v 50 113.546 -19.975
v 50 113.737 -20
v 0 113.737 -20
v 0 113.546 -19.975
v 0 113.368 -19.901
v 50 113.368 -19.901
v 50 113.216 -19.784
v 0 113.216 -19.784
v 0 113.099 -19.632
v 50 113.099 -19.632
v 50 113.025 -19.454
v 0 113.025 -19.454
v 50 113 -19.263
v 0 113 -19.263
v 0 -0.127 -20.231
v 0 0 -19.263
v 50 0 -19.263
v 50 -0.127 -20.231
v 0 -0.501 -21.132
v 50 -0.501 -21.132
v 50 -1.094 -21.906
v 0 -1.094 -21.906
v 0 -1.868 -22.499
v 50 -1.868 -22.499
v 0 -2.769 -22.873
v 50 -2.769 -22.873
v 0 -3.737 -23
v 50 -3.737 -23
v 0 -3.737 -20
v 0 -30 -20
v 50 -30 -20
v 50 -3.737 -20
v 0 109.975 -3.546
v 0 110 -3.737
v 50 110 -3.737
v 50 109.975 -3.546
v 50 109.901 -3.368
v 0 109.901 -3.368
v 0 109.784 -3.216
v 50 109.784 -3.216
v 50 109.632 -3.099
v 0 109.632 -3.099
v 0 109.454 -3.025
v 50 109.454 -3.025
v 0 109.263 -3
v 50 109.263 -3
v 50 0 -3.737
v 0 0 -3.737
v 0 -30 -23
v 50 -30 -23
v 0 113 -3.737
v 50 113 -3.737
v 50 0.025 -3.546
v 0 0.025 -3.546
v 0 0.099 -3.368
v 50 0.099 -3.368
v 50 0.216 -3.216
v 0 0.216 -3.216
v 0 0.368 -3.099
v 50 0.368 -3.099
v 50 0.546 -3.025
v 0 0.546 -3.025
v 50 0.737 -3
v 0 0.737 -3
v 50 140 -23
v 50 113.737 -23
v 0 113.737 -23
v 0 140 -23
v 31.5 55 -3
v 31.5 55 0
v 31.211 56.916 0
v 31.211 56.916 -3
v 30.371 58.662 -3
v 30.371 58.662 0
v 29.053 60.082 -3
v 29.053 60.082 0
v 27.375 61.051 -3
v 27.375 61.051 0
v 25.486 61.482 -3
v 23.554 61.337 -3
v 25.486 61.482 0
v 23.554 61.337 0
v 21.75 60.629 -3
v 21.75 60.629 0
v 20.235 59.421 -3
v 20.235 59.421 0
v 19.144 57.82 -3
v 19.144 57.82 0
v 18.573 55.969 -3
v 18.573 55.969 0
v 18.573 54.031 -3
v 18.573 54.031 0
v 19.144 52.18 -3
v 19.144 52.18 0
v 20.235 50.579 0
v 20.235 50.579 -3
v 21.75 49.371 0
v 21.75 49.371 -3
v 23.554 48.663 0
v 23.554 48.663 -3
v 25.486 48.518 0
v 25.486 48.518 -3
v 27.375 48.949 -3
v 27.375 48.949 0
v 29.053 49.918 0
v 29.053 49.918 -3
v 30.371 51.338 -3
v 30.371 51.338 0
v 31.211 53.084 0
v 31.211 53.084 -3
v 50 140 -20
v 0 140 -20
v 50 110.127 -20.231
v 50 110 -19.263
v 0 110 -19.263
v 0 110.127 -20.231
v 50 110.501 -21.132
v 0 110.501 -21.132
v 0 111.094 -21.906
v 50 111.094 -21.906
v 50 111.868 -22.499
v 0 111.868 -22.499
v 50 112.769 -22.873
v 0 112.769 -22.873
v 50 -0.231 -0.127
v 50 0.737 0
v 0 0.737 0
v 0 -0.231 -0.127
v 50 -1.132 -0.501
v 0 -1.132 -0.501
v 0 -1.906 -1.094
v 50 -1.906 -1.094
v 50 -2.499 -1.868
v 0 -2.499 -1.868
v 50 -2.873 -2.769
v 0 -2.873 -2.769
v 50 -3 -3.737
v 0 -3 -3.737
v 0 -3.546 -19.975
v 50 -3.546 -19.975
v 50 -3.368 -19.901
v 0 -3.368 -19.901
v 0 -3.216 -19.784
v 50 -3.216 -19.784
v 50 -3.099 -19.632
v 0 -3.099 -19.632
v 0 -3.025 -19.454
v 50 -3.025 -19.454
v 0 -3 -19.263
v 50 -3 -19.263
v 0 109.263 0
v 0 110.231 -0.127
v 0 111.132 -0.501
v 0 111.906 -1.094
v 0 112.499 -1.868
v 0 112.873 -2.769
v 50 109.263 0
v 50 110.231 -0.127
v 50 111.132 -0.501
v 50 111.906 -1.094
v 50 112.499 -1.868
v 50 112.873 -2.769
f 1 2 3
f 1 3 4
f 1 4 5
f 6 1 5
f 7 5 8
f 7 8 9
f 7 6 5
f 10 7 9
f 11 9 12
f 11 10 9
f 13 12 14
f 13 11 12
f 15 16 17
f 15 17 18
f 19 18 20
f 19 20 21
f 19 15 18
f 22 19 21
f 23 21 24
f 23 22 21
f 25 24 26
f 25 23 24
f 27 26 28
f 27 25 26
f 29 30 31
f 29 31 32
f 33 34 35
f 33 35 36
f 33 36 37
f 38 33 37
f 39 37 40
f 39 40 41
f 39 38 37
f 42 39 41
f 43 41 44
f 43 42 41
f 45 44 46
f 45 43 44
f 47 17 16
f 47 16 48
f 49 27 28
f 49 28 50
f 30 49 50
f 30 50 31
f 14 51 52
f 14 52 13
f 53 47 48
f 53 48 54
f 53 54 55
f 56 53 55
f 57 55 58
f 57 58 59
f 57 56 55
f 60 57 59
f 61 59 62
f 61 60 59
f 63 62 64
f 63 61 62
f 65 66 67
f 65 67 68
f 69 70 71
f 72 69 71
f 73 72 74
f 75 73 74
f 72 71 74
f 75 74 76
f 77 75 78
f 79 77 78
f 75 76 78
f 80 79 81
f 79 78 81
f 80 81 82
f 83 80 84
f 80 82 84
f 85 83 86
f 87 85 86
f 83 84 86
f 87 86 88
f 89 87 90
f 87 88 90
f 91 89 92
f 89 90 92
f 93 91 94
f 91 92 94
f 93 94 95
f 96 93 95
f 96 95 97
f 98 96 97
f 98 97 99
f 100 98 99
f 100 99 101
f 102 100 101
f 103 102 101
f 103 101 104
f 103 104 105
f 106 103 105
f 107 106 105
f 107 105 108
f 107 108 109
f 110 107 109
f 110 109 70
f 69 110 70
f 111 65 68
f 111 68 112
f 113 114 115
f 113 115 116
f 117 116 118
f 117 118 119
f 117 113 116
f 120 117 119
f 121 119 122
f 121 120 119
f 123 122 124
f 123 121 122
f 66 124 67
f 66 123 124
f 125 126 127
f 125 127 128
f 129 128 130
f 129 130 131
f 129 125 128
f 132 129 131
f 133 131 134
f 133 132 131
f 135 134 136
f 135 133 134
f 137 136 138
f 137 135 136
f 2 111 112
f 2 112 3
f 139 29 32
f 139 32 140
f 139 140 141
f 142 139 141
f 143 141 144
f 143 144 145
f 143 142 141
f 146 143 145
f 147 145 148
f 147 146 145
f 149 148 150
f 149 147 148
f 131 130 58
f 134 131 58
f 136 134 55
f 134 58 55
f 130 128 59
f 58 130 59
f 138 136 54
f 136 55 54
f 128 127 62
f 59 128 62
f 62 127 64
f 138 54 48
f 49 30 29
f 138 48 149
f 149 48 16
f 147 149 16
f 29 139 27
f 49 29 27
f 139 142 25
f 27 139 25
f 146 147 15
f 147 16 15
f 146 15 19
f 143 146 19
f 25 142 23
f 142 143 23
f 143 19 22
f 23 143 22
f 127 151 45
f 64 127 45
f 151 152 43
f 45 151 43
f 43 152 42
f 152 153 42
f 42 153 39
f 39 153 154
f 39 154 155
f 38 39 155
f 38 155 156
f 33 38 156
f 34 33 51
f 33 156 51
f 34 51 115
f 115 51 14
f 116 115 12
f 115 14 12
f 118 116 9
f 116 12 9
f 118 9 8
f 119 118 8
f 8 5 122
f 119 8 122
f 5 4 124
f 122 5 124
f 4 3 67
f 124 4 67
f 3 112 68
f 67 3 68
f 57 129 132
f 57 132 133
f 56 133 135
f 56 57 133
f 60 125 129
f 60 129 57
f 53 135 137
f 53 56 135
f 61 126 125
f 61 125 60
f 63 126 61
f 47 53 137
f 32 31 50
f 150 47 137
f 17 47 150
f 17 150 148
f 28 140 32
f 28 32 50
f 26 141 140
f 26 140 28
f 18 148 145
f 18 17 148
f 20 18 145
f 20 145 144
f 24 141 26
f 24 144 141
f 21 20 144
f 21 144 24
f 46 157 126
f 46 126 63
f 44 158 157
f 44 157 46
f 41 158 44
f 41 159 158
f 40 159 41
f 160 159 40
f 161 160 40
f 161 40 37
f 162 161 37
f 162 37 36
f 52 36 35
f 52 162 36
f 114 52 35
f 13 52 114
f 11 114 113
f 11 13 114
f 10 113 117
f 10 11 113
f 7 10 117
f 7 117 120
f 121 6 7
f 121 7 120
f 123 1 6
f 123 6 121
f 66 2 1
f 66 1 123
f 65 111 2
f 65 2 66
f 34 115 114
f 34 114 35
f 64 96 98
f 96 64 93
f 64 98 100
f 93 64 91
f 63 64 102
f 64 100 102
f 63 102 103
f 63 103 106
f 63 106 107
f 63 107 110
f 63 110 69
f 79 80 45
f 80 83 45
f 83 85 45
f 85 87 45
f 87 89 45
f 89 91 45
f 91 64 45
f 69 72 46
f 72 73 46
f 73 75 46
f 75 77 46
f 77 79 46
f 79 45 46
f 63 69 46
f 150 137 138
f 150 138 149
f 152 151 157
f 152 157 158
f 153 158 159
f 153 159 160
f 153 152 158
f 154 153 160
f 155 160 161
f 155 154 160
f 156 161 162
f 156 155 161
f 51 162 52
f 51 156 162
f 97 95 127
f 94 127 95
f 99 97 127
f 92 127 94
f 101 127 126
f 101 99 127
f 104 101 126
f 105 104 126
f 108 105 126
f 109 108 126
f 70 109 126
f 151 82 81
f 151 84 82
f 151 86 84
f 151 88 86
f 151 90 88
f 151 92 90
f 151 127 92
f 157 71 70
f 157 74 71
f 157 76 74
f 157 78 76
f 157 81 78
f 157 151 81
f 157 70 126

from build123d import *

# Parameters (mm, degrees)
SKETCH_1_W                         = 50
SKETCH_1_H                         = 110
SM_BASE_FLANGE_1_DEPTH             = 3
SM_EDGE_FLANGE_1_STRIP_W           = 13.4732
SM_EDGE_FLANGE_1_STRIP_H           = 3
SM_EDGE_FLANGE_1_STRIP_CUT_DEPTH   = 50
SM_EDGE_FLANGE_1_STRIP_2_W         = 13.4732
SM_EDGE_FLANGE_1_STRIP_2_H         = 3
SM_EDGE_FLANGE_1_STRIP_CUT_2_DEPTH = 50
SM_EDGE_FLANGE_1_DEPTH             = 50
SM_EDGE_FLANGE_1_BEND_DEPTH        = 50
SM_EDGE_FLANGE_2_STRIP_W           = 13.4732
SM_EDGE_FLANGE_2_STRIP_H           = 3
SM_EDGE_FLANGE_2_STRIP_CUT_DEPTH   = 50
SM_EDGE_FLANGE_2_STRIP_2_W         = 13.4732
SM_EDGE_FLANGE_2_STRIP_2_H         = 3
SM_EDGE_FLANGE_2_STRIP_CUT_2_DEPTH = 50
SM_EDGE_FLANGE_2_DEPTH             = 50
SM_EDGE_FLANGE_2_BEND_DEPTH        = 50
SKETCH_18_R                        = 6.5
CUT_EXTRUDE_1_DEPTH                = 151.429385427


# Sheet-metal steps are written as plain solids
with BuildPart() as part:
    # Sketch 1 → 基体-法兰1 (new body)
    with BuildSketch(Plane.XY):
        with Locations((25, 55)):
            Rectangle(SKETCH_1_W, SKETCH_1_H)
    extrude(amount=-SM_BASE_FLANGE_1_DEPTH)

    # 边线-法兰1 strip (across the edge) → 边线-法兰1 strip cut (cut)
    with BuildSketch(Plane(origin=(0, 110, -3), x_dir=(0, -1, 0), z_dir=(1, 0, 0))):
        with Locations((-6, -1.5)):
            Rectangle(SM_EDGE_FLANGE_1_STRIP_W, SM_EDGE_FLANGE_1_STRIP_H)
    extrude(amount=SM_EDGE_FLANGE_1_STRIP_CUT_DEPTH, mode=Mode.SUBTRACT)

    # 边线-法兰1 strip 2 (across the edge) → 边线-法兰1 strip cut 2 (cut)
    with BuildSketch(Plane(origin=(50, 0, -3), x_dir=(0, 1, 0), z_dir=(-1, 0, 0))):
        with Locations((-6, -1.5)):
            Rectangle(SM_EDGE_FLANGE_1_STRIP_2_W, SM_EDGE_FLANGE_1_STRIP_2_H)
    extrude(amount=SM_EDGE_FLANGE_1_STRIP_CUT_2_DEPTH, mode=Mode.SUBTRACT)

    # 边线-法兰1 section (across the edge) → 边线-法兰1 (add)
    with BuildSketch(Plane(origin=(0, 110, -3), x_dir=(0, -1, 0), z_dir=(1, 0, 0))):
        with BuildLine():
            Line((-3, 0.7366), (-3, 17))
            Line((-3, 17), (0, 17))
            Line((0, 17), (0, 0.7366))
            ThreePointArc((0, 0.7366), (0.215745145, 0.215745145), (0.7366, 0))
            Line((0.7366, 0), (0.7366, -3))
            ThreePointArc((0.7366, -3), (-1.905575199, -1.905575199), (-3, 0.7366))
        make_face()
    extrude(amount=SM_EDGE_FLANGE_1_DEPTH)

    # 边线-法兰1 section 2 (across the edge) → 边线-法兰1 bend (add)
    with BuildSketch(Plane(origin=(50, 0, -3), x_dir=(0, 1, 0), z_dir=(-1, 0, 0))):
        with BuildLine():
            Line((-3, 0.7366), (-3, 17))
            Line((-3, 17), (0, 17))
            Line((0, 17), (0, 0.7366))
            ThreePointArc((0, 0.7366), (0.215745145, 0.215745145), (0.7366, 0))
            Line((0.7366, 0), (0.7366, -3))
            ThreePointArc((0.7366, -3), (-1.905575199, -1.905575199), (-3, 0.7366))
        make_face()
    extrude(amount=SM_EDGE_FLANGE_1_BEND_DEPTH)

    # 边线-法兰2 strip (across the edge) → 边线-法兰2 strip cut (cut)
    with BuildSketch(Plane(origin=(0, -3, -20), x_dir=(0, 0, 1), z_dir=(1, 0, 0))):
        with Locations((-6, -1.5)):
            Rectangle(SM_EDGE_FLANGE_2_STRIP_W, SM_EDGE_FLANGE_2_STRIP_H)
    extrude(amount=SM_EDGE_FLANGE_2_STRIP_CUT_DEPTH, mode=Mode.SUBTRACT)

    # 边线-法兰2 strip 2 (across the edge) → 边线-法兰2 strip cut 2 (cut)
    with BuildSketch(Plane(origin=(50, 113, -20), x_dir=(0, 0, 1), z_dir=(-1, 0, 0))):
        with Locations((-6, -1.5)):
            Rectangle(SM_EDGE_FLANGE_2_STRIP_2_W, SM_EDGE_FLANGE_2_STRIP_2_H)
    extrude(amount=SM_EDGE_FLANGE_2_STRIP_CUT_2_DEPTH, mode=Mode.SUBTRACT)

    # 边线-法兰2 section (across the edge) → 边线-法兰2 (add)
    with BuildSketch(Plane(origin=(0, -3, -20), x_dir=(0, 0, 1), z_dir=(1, 0, 0))):
        with BuildLine():
            Line((-3, 0.7366), (-3, 27))
            Line((-3, 27), (0, 27))
            Line((0, 27), (0, 0.7366))
            ThreePointArc((0, 0.7366), (0.215745145, 0.215745145), (0.7366, 0))
            Line((0.7366, 0), (0.7366, -3))
            ThreePointArc((0.7366, -3), (-1.905575199, -1.905575199), (-3, 0.7366))
        make_face()
    extrude(amount=SM_EDGE_FLANGE_2_DEPTH)

    # 边线-法兰2 section 2 (across the edge) → 边线-法兰2 bend (add)
    with BuildSketch(Plane(origin=(50, 113, -20), x_dir=(0, 0, 1), z_dir=(-1, 0, 0))):
        with BuildLine():
            Line((-3, 0.7366), (-3, 27))
            Line((-3, 27), (0, 27))
            Line((0, 27), (0, 0.7366))
            ThreePointArc((0, 0.7366), (0.215745145, 0.215745145), (0.7366, 0))
            Line((0.7366, 0), (0.7366, -3))
            ThreePointArc((0.7366, -3), (-1.905575199, -1.905575199), (-3, 0.7366))
        make_face()
    extrude(amount=SM_EDGE_FLANGE_2_BEND_DEPTH)

    # 草图18 → 切除-拉伸1 (cut, through all)
    with BuildSketch(Plane.XY):
        with Locations((25, 55)):
            Circle(SKETCH_18_R)
    extrude(amount=-CUT_EXTRUDE_1_DEPTH, mode=Mode.SUBTRACT)


solid = part.part
